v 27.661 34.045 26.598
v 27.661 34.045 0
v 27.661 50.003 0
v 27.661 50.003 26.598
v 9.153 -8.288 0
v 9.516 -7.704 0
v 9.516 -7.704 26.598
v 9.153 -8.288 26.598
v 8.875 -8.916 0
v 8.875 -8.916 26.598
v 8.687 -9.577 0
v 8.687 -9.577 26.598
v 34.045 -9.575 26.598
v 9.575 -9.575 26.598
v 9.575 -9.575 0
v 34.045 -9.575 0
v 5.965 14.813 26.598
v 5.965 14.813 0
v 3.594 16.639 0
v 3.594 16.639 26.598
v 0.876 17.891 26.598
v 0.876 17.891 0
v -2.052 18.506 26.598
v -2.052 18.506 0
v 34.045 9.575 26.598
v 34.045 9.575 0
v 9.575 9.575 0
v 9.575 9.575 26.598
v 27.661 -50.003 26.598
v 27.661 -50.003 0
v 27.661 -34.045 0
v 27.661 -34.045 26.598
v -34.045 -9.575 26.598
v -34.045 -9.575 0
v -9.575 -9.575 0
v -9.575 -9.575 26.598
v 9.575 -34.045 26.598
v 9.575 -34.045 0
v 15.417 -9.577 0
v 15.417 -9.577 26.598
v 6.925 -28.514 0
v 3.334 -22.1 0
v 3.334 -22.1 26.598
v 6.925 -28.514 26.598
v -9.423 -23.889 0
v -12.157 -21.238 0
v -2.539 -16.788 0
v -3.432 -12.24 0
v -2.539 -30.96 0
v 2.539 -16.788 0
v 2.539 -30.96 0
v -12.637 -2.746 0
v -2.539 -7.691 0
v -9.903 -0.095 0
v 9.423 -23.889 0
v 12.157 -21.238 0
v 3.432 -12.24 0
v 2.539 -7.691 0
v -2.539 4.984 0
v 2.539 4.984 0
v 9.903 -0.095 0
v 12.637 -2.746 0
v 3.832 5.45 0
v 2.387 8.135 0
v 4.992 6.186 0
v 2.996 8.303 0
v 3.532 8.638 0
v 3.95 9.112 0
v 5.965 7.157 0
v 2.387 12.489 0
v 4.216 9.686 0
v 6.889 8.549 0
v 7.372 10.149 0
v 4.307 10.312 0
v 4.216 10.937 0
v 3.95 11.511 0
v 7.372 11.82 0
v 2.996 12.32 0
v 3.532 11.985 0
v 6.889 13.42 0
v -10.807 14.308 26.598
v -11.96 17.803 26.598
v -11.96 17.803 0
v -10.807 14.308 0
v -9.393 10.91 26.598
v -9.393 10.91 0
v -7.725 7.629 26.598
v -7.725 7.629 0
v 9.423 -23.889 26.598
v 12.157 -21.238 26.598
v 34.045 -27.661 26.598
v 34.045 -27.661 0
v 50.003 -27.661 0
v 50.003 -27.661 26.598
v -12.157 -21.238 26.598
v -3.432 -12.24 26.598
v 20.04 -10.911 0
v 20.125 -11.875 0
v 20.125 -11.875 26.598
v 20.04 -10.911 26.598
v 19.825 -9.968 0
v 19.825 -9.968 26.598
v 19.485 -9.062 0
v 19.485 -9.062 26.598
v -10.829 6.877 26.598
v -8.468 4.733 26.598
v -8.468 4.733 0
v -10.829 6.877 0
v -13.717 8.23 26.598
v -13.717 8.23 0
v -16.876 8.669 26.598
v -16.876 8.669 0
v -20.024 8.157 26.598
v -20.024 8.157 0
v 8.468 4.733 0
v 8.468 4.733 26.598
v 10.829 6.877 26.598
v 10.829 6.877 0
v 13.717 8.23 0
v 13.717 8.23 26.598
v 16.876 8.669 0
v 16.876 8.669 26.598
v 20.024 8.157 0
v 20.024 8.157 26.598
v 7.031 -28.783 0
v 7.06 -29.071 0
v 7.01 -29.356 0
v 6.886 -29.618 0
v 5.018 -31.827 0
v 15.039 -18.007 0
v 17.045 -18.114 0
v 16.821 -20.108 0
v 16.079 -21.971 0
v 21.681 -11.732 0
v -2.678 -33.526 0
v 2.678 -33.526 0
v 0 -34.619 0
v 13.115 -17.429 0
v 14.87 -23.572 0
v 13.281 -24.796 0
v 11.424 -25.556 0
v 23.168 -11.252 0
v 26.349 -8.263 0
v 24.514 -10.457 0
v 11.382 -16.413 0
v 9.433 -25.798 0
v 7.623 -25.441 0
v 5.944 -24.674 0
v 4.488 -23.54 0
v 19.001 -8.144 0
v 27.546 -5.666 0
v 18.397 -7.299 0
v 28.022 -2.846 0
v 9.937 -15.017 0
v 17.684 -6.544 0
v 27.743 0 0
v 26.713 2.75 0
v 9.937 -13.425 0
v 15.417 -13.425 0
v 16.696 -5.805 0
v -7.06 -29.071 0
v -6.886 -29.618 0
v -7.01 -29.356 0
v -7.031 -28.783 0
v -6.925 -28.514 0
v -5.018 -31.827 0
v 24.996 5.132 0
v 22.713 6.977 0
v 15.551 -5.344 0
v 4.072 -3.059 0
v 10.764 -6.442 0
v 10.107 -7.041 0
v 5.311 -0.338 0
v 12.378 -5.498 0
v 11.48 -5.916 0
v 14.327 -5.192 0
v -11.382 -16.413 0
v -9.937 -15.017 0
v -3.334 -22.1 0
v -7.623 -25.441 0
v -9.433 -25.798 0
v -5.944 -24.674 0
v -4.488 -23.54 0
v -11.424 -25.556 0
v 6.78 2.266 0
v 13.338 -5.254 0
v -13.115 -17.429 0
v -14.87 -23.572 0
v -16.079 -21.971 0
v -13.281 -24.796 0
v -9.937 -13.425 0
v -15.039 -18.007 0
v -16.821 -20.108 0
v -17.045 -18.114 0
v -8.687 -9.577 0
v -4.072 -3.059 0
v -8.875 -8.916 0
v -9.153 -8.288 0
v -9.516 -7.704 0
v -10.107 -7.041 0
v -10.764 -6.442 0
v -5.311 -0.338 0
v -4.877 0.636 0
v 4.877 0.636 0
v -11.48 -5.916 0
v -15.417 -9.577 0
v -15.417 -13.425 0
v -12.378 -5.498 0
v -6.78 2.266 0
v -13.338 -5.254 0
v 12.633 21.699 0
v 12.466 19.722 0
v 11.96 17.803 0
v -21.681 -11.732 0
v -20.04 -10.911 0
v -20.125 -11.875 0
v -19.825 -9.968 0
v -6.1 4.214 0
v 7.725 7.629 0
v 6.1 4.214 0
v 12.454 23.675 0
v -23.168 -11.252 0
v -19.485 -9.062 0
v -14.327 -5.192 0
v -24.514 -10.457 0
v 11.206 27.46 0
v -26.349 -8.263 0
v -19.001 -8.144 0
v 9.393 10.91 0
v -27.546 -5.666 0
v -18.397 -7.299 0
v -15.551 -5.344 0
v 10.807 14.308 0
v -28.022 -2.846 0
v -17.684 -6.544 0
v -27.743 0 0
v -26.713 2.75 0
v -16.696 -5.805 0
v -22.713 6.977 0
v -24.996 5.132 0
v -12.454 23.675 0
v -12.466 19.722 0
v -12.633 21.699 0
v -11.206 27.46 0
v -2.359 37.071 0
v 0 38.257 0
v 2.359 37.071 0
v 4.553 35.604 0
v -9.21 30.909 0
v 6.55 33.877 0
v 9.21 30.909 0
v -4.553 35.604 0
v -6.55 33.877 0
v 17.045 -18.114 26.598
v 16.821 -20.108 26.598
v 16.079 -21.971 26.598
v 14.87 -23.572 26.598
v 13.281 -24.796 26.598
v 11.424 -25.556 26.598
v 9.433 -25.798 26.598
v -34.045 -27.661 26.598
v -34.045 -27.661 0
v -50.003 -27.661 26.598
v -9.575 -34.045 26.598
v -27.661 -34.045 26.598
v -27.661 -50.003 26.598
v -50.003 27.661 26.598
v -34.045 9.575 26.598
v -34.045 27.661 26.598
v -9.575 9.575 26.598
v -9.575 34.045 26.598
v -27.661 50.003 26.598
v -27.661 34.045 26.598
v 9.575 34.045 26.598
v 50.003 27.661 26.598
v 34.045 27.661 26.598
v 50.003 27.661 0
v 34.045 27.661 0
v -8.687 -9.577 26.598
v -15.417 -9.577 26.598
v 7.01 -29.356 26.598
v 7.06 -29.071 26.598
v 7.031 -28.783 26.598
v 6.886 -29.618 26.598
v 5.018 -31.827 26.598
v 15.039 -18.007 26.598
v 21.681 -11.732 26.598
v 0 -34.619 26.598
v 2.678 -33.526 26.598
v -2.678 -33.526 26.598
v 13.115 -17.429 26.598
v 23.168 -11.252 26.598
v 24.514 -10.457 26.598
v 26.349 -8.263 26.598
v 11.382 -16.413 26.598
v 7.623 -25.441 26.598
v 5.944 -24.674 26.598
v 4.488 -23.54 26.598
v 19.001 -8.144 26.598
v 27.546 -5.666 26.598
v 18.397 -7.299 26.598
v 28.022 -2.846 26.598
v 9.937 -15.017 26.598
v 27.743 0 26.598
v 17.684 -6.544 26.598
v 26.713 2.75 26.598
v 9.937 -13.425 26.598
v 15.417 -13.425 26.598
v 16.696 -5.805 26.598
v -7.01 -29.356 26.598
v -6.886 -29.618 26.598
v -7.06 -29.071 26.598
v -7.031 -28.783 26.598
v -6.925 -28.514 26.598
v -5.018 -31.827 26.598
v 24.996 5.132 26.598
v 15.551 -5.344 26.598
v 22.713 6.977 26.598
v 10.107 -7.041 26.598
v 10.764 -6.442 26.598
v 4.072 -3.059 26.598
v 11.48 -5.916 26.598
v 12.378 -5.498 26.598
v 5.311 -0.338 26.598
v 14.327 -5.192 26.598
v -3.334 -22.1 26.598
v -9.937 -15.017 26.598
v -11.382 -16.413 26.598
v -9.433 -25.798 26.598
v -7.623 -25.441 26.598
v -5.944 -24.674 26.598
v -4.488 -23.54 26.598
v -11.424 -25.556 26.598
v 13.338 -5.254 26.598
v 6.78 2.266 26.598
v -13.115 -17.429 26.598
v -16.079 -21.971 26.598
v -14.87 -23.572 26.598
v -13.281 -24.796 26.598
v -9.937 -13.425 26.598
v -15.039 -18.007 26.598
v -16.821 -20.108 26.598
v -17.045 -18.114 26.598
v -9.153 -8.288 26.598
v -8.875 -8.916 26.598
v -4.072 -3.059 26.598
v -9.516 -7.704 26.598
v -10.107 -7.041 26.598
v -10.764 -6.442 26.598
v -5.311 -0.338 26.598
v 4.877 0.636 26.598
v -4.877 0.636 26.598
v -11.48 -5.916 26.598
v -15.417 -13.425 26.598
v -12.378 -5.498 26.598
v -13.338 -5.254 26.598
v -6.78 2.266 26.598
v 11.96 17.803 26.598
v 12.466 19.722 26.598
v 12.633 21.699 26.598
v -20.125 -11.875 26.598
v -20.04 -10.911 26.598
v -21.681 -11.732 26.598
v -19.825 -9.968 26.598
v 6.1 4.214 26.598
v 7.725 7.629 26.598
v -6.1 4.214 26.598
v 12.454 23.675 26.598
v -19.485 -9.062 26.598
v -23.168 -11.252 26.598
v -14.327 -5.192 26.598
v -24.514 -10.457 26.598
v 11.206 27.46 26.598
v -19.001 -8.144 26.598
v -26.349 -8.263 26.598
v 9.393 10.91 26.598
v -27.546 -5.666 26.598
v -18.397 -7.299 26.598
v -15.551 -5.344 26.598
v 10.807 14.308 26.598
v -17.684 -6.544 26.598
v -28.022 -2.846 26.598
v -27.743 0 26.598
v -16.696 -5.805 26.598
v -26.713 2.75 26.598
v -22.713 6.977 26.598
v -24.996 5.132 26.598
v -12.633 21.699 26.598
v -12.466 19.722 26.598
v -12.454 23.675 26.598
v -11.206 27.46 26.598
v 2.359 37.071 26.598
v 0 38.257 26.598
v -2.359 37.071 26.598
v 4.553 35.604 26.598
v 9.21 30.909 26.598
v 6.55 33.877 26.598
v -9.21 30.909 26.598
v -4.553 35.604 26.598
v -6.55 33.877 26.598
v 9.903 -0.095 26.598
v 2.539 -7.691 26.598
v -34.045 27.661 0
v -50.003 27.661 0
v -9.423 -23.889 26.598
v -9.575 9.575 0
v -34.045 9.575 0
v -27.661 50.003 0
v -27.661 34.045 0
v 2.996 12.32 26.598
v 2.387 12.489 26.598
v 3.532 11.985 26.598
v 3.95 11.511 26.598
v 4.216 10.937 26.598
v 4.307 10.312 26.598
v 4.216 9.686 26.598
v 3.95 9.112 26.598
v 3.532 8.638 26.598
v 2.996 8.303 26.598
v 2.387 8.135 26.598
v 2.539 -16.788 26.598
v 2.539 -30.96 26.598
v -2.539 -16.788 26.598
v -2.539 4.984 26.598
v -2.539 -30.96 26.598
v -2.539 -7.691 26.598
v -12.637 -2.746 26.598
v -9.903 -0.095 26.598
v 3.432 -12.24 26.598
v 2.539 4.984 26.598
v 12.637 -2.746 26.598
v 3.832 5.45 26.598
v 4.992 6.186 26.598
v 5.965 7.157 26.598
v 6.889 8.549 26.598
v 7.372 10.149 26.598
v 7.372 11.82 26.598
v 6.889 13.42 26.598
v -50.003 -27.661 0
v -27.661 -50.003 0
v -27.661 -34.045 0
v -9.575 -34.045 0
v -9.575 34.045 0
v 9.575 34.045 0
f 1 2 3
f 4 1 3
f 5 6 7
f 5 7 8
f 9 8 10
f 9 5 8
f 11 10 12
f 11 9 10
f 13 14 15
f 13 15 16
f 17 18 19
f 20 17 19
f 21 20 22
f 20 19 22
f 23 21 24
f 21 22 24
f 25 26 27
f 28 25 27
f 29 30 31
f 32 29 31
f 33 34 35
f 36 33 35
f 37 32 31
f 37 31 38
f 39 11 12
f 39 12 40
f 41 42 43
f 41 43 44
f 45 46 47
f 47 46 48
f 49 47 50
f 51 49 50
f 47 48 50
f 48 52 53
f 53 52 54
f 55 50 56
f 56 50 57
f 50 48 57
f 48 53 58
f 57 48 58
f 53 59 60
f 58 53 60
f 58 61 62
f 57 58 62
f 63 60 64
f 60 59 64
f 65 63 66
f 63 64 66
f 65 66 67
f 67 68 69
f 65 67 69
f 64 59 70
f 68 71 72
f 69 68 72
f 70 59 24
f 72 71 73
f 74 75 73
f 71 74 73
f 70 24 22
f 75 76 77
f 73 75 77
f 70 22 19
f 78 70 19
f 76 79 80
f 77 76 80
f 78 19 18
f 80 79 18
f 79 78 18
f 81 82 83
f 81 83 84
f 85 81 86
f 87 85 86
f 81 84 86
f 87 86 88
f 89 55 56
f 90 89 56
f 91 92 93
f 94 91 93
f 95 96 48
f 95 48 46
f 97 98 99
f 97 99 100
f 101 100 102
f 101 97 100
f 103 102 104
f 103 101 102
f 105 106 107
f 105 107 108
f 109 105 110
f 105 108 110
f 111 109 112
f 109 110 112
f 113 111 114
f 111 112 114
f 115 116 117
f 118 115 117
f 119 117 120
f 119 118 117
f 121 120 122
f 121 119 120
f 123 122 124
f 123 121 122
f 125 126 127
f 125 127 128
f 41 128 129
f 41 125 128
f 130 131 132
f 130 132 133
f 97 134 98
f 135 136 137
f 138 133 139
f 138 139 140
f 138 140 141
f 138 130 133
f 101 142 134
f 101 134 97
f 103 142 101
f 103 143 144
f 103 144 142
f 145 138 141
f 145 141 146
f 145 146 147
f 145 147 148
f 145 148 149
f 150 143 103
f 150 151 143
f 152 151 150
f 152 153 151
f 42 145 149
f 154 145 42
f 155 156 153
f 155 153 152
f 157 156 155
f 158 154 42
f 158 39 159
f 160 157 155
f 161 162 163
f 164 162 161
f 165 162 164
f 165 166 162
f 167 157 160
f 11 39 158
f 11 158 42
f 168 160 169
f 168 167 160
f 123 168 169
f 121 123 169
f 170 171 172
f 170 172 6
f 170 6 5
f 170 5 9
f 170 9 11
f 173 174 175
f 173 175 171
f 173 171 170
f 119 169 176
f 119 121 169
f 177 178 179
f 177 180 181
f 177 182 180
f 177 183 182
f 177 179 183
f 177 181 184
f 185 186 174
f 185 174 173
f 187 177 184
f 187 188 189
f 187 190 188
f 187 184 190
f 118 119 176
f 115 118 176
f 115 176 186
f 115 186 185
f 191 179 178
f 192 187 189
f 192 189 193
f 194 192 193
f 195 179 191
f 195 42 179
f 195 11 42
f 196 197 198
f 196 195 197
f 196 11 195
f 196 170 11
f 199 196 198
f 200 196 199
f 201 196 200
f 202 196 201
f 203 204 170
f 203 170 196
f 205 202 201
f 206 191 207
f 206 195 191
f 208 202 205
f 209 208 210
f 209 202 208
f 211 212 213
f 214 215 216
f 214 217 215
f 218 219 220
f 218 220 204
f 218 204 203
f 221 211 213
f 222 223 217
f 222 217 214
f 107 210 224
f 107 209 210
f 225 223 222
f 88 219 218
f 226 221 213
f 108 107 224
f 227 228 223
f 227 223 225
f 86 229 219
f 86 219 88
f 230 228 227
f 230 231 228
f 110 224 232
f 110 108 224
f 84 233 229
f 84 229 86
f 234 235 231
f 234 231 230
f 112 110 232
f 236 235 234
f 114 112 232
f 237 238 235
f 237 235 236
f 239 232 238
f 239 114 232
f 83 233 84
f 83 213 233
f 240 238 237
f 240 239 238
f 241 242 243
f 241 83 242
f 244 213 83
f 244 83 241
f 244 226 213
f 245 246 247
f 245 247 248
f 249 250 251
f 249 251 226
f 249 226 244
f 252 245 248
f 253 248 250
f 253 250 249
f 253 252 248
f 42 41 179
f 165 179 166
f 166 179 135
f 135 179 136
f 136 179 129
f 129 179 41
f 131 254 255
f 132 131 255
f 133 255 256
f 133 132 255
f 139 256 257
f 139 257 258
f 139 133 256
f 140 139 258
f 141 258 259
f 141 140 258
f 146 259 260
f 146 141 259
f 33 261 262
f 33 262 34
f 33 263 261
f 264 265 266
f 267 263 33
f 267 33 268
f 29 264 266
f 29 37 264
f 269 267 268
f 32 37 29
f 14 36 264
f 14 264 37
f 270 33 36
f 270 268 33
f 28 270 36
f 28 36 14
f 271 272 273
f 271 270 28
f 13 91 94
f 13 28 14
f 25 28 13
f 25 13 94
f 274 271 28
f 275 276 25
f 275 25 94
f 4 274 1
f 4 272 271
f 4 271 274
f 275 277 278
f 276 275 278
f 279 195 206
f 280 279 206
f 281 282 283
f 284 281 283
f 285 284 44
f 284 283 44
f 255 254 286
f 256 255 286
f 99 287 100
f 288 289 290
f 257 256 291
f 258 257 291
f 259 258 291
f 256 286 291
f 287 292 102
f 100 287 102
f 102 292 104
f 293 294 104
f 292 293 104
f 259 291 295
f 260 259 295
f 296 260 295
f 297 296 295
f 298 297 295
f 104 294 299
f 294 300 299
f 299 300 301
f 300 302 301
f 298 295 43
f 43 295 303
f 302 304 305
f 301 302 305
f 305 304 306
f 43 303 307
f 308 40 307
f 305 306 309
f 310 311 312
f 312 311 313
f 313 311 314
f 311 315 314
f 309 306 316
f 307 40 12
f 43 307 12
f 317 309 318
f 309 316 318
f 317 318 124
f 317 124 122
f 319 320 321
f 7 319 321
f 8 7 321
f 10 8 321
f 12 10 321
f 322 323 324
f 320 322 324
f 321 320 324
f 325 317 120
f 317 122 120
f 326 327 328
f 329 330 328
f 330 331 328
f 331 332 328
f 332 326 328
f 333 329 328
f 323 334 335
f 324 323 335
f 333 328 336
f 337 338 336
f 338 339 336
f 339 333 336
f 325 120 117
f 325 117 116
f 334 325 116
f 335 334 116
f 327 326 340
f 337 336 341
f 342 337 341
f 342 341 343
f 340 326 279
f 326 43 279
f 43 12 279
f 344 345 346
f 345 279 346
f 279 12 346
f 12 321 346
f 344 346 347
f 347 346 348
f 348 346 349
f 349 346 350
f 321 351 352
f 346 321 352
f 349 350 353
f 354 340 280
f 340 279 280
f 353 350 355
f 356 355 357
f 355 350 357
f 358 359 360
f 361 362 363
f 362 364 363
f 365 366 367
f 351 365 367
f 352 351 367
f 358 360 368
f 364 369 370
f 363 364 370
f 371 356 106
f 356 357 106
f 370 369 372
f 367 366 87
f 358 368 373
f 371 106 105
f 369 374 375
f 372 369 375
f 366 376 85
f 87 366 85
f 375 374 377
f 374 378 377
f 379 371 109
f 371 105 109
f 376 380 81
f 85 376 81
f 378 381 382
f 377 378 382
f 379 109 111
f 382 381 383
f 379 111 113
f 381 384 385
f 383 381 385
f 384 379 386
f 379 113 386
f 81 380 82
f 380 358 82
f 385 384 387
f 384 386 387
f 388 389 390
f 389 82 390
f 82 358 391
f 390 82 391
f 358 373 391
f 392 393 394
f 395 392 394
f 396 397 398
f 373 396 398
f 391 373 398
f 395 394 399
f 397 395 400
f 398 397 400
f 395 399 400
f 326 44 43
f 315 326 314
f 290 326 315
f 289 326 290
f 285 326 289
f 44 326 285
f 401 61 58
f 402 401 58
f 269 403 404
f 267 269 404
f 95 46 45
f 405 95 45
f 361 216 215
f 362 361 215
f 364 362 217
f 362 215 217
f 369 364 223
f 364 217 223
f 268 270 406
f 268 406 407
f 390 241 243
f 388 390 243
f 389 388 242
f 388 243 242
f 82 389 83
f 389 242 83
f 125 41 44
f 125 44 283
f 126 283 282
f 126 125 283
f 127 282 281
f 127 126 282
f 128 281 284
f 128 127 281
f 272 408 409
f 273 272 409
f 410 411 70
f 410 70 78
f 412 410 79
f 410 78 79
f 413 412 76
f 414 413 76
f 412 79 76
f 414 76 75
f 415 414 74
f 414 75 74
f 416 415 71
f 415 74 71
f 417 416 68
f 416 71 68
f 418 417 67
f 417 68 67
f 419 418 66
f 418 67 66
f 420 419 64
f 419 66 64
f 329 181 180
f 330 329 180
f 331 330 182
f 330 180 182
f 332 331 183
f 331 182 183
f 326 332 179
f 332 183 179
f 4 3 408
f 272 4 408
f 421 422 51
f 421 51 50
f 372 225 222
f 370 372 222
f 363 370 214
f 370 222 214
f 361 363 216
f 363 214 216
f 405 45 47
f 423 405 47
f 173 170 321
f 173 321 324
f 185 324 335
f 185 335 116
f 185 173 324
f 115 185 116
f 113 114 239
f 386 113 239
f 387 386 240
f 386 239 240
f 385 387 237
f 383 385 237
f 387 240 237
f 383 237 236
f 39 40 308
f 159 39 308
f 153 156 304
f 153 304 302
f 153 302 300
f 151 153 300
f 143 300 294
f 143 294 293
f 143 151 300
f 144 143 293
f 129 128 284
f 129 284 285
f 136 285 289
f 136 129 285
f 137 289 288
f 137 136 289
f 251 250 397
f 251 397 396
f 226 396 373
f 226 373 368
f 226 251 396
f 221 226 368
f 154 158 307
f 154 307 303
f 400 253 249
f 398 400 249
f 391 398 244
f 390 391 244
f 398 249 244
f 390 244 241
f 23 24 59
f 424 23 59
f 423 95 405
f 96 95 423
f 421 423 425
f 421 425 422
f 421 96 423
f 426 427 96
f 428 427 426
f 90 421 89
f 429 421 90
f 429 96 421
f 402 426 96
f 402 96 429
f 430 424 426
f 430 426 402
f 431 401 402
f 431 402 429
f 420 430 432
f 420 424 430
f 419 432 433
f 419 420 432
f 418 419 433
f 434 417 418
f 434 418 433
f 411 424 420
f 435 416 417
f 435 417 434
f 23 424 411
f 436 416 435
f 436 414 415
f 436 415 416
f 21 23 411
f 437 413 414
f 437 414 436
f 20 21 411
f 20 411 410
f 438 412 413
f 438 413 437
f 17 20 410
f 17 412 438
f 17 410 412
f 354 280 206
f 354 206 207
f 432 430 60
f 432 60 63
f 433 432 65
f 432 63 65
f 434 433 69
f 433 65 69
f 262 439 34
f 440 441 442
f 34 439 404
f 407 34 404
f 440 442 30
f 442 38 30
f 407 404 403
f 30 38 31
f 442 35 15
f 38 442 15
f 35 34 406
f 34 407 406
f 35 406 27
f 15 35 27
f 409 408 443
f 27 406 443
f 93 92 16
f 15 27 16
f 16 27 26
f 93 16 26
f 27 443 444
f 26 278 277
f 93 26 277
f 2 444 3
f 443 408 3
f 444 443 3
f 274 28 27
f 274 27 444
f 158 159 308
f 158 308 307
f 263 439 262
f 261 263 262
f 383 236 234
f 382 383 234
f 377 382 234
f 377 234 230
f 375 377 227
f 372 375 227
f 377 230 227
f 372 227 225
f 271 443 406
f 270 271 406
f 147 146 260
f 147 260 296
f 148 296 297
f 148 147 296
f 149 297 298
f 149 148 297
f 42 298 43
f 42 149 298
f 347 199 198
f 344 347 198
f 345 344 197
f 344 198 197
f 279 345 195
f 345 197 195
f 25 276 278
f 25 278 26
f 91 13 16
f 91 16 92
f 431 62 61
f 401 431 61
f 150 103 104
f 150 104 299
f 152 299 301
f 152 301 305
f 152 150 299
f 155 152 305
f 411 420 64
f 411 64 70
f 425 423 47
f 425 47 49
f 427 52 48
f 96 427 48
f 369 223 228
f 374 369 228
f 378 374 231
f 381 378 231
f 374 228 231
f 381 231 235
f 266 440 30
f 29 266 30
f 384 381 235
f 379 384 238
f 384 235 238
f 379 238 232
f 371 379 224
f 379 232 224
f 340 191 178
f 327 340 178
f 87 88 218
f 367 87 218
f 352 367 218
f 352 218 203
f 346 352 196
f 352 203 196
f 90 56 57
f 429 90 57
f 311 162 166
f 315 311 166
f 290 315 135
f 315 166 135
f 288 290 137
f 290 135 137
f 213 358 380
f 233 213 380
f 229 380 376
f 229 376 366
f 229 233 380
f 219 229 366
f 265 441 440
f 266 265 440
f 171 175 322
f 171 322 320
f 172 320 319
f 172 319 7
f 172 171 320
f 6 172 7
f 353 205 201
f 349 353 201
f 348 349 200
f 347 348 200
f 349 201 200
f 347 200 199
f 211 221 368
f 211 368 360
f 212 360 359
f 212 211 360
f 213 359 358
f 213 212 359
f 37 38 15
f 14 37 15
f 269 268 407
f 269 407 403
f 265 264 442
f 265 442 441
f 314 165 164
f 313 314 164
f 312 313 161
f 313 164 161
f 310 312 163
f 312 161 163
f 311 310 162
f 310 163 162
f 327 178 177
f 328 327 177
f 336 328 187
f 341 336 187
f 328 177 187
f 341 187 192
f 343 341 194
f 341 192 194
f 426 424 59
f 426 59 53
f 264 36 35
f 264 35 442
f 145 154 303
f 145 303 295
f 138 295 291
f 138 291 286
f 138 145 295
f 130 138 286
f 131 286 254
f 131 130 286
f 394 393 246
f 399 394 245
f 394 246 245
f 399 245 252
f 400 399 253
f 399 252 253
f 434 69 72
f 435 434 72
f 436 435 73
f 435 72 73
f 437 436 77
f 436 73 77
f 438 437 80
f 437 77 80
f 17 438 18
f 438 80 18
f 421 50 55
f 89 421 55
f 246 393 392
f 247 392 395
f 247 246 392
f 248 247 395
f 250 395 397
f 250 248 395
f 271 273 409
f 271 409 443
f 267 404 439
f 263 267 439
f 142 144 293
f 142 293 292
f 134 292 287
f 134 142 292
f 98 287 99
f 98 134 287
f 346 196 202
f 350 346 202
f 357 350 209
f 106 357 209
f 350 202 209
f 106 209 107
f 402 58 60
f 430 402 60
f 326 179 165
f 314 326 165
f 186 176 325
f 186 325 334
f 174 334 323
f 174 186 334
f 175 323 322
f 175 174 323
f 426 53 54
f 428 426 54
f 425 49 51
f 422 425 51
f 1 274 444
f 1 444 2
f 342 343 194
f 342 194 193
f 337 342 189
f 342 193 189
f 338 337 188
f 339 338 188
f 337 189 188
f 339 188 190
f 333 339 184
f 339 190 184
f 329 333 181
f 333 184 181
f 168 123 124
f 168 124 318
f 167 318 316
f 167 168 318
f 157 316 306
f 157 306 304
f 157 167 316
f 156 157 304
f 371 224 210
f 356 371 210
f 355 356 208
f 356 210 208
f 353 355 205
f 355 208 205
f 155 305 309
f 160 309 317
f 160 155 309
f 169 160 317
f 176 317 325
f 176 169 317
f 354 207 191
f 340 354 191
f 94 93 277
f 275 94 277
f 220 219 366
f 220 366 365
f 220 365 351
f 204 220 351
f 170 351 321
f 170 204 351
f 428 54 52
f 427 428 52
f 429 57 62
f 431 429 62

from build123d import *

# Parameters (mm, degrees)
F4_DEPTH = 25
F6_DEPTH = 25
F7_DEPTH = 25
F8_SCALE = 1.0639


with BuildPart() as f4:
    # F1 (on Top) → F4 (new body)
    with BuildSketch(Plane.XY):
        with BuildLine():
            Line((0, -32.5396172702), (0, 35.9592616823))
            ThreePointArc((0, 35.9592616823), (-3.2697243903, 34.1869293921), (-6.1570475209, 31.842654563))
            ThreePointArc((-6.1570475209, 31.842654563), (-9.678511735, 27.4797860383), (-11.7063832465, 22.2526387181))
            ThreePointArc((-11.7063832465, 22.2526387181), (-11.8362878055, 19.4628050637), (-11.2418027388, 16.7339528289))
            ThreePointArc((-11.2418027388, 16.7339528289), (-9.5234916383, 11.8388817508), (-7.2609484196, 7.1703474969))
            ThreePointArc((-7.2609484196, 7.1703474969), (-5.1102294701, 2.295669753), (-3.8272319362, -2.8755962849))
            ThreePointArc((-3.8272319362, -2.8755962849), (-5.6557055069, 0.9208248858), (-7.9597122967, 4.4489521533))
            ThreePointArc((-7.9597122967, 4.4489521533), (-12.8934125497, 7.735368551), (-18.8210848719, 7.6673114672))
            ThreePointArc((-18.8210848719, 7.6673114672), (-23.4948725765, 4.823338176), (-26.0770972818, 0))
            ThreePointArc((-26.0770972818, 0), (-25.8916050048, -5.3258386332), (-23.0417121202, -9.8288459703))
            ThreePointArc((-23.0417121202, -9.8288459703), (-21.0904351996, -10.8402117285), (-18.9162939787, -11.1618516967))
            ThreePointArc((-18.9162939787, -11.1618516967), (-18.7505935469, -9.8090288122), (-18.3148639608, -8.5176241051))
            ThreePointArc((-18.3148639608, -8.5176241051), (-17.5891277306, -7.24802711), (-16.6217970491, -6.1512860474))
            ThreePointArc((-16.6217970491, -6.1512860474), (-15.1691912992, -5.204689655), (-13.4660750628, -4.8798769712))
            ThreePointArc((-13.4660750628, -4.8798769712), (-12.0805726197, -5.0325619293), (-10.7904189828, -5.5602297313))
            ThreePointArc((-10.7904189828, -5.5602297313), (-9.8014590545, -6.3284370043), (-8.9444001864, -7.2414727378))
            ThreePointArc((-8.9444001864, -7.2414727378), (-8.4618703636, -8.0806833732), (-8.1655316146, -9.002254242))
            Line((-8.1655316146, -9.002254242), (-14.4911732853, -9.002254242))
            Line((-14.4911732853, -9.002254242), (-14.4911732853, -12.6185957342))
            Line((-14.4911732853, -12.6185957342), (-9.340364486, -12.6185957342))
            Line((-9.340364486, -12.6185957342), (-9.340364486, -14.1148399562))
            ThreePointArc((-9.340364486, -14.1148399562), (-12.3270728412, -16.3817179569), (-16.0208158195, -17.0262530446))
            ThreePointArc((-16.0208158195, -17.0262530446), (-13.9766014859, -22.1559219559), (-8.8664144278, -24.2483615875))
            ThreePointArc((-8.8664144278, -24.2483615875), (-5.5868333909, -23.1922287531), (-3.1338650733, -20.7727216184))
            Line((-3.1338650733, -20.7727216184), (-6.5089949237, -26.8010321734))
            ThreePointArc((-6.5089949237, -26.8010321734), (-6.635815165, -27.3250204015), (-6.4721712063, -27.8387009361))
            ThreePointArc((-6.4721712063, -27.8387009361), (-3.6653485725, -30.7801637568), (0, -32.5396172702))
        make_face()
    extrude(amount=F4_DEPTH)

    # F5: F4 across face


with BuildPart() as f4_1:
    add(f4.part)
    add(f4.part.mirror(Plane(origin=(0, 1.709822206, 12.5), x_dir=(0, 1, 0), z_dir=(1, 0, 0))))


with BuildPart() as f6:
    # F2 (on Top) → F6 (new body)
    with BuildSketch(Plane.XY):
        with BuildLine():
            ThreePointArc((5.6064678356, 6.7269327119), (6.9866446891, 10.3249023668), (5.6064678356, 13.9228720218))
            ThreePointArc((5.6064678356, 13.9228720218), (2.1339699461, 16.2994871237), (-1.9288528711, 17.3949375749))
            Line((-1.9288528711, 17.3949375749), (-2.3866211995, 4.6849809587))
            Line((-2.3866211995, 4.6849809587), (-2.3866211995, -7.2287432849))
            Line((-2.3866211995, -7.2287432849), (-9.308461056, -0.0897167804))
            Line((-9.308461056, -0.0897167804), (-11.8778402445, -2.5809291694))
            Line((-11.8778402445, -2.5809291694), (-3.2258499414, -11.5043930709))
            Line((-3.2258499414, -11.5043930709), (-11.4267019294, -19.9625632853))
            Line((-11.4267019294, -19.9625632853), (-8.8573227409, -22.4537756743))
            Line((-8.8573227409, -22.4537756743), (-2.3866211995, -15.7800428569))
            Line((-2.3866211995, -15.7800428569), (-2.3866211995, -29.1008576751))
            Line((-2.3866211995, -29.1008576751), (0, -29.1008576751))
            Line((0, -29.1008576751), (2.3866211995, -29.1008576751))
            Line((2.3866211995, -29.1008576751), (2.3866211995, -15.7800428569))
            Line((2.3866211995, -15.7800428569), (8.8573227409, -22.4537756743))
            Line((8.8573227409, -22.4537756743), (11.4267019294, -19.9625632853))
            Line((11.4267019294, -19.9625632853), (3.2258499414, -11.5043930709))
            Line((3.2258499414, -11.5043930709), (11.8778402445, -2.5809291694))
            Line((11.8778402445, -2.5809291694), (9.308461056, -0.0897167804))
            Line((9.308461056, -0.0897167804), (2.3866211995, -7.2287432849))
            Line((2.3866211995, -7.2287432849), (2.3866211995, 4.6849809587))
            ThreePointArc((2.3866211995, 4.6849809587), (4.1658651322, 5.4389640375), (5.6064678356, 6.7269327119))
        make_face()
        with BuildLine():
            Line((2.2432571277, 7.6459771954), (2.2432571277, 11.7384465411))
            ThreePointArc((2.2432571277, 11.7384465411), (4.0483159092, 9.6922118682), (2.2432571277, 7.6459771954))
        make_face(mode=Mode.SUBTRACT)
    extrude(amount=F6_DEPTH)


with BuildPart() as f7:
    # F3 (on Top) → F7 (new body)
    with BuildSketch(Plane.XY):
        Polygon((-32, 26), (-47, 26), (-47, 0), (-47, -26), (-32, -26), (-32, -9), (-9, -9), (-9, -32), (-26, -32), (-26, -47), (0, -47), (26, -47), (26, -32), (9, -32), (9, -9), (32, -9), (32, -26), (47, -26), (47, 0), (47, 26), (32, 26), (32, 9), (9, 9), (9, 32), (26, 32), (26, 47), (0, 47), (-26, 47), (-26, 32), (-9, 32), (-9, 9), (-32, 9), align=None)
    extrude(amount=F7_DEPTH)


with BuildPart() as f4_2:
    # F8: moved
    add(f4_1.part.scale(F8_SCALE))


with BuildPart() as f6_1:
    # F8: moved
    add(f6.part.scale(F8_SCALE))


with BuildPart() as f7_1:
    # F8: moved
    add(f7.part.scale(F8_SCALE))


solid = Compound([f4_2.part, f6_1.part, f7_1.part])
